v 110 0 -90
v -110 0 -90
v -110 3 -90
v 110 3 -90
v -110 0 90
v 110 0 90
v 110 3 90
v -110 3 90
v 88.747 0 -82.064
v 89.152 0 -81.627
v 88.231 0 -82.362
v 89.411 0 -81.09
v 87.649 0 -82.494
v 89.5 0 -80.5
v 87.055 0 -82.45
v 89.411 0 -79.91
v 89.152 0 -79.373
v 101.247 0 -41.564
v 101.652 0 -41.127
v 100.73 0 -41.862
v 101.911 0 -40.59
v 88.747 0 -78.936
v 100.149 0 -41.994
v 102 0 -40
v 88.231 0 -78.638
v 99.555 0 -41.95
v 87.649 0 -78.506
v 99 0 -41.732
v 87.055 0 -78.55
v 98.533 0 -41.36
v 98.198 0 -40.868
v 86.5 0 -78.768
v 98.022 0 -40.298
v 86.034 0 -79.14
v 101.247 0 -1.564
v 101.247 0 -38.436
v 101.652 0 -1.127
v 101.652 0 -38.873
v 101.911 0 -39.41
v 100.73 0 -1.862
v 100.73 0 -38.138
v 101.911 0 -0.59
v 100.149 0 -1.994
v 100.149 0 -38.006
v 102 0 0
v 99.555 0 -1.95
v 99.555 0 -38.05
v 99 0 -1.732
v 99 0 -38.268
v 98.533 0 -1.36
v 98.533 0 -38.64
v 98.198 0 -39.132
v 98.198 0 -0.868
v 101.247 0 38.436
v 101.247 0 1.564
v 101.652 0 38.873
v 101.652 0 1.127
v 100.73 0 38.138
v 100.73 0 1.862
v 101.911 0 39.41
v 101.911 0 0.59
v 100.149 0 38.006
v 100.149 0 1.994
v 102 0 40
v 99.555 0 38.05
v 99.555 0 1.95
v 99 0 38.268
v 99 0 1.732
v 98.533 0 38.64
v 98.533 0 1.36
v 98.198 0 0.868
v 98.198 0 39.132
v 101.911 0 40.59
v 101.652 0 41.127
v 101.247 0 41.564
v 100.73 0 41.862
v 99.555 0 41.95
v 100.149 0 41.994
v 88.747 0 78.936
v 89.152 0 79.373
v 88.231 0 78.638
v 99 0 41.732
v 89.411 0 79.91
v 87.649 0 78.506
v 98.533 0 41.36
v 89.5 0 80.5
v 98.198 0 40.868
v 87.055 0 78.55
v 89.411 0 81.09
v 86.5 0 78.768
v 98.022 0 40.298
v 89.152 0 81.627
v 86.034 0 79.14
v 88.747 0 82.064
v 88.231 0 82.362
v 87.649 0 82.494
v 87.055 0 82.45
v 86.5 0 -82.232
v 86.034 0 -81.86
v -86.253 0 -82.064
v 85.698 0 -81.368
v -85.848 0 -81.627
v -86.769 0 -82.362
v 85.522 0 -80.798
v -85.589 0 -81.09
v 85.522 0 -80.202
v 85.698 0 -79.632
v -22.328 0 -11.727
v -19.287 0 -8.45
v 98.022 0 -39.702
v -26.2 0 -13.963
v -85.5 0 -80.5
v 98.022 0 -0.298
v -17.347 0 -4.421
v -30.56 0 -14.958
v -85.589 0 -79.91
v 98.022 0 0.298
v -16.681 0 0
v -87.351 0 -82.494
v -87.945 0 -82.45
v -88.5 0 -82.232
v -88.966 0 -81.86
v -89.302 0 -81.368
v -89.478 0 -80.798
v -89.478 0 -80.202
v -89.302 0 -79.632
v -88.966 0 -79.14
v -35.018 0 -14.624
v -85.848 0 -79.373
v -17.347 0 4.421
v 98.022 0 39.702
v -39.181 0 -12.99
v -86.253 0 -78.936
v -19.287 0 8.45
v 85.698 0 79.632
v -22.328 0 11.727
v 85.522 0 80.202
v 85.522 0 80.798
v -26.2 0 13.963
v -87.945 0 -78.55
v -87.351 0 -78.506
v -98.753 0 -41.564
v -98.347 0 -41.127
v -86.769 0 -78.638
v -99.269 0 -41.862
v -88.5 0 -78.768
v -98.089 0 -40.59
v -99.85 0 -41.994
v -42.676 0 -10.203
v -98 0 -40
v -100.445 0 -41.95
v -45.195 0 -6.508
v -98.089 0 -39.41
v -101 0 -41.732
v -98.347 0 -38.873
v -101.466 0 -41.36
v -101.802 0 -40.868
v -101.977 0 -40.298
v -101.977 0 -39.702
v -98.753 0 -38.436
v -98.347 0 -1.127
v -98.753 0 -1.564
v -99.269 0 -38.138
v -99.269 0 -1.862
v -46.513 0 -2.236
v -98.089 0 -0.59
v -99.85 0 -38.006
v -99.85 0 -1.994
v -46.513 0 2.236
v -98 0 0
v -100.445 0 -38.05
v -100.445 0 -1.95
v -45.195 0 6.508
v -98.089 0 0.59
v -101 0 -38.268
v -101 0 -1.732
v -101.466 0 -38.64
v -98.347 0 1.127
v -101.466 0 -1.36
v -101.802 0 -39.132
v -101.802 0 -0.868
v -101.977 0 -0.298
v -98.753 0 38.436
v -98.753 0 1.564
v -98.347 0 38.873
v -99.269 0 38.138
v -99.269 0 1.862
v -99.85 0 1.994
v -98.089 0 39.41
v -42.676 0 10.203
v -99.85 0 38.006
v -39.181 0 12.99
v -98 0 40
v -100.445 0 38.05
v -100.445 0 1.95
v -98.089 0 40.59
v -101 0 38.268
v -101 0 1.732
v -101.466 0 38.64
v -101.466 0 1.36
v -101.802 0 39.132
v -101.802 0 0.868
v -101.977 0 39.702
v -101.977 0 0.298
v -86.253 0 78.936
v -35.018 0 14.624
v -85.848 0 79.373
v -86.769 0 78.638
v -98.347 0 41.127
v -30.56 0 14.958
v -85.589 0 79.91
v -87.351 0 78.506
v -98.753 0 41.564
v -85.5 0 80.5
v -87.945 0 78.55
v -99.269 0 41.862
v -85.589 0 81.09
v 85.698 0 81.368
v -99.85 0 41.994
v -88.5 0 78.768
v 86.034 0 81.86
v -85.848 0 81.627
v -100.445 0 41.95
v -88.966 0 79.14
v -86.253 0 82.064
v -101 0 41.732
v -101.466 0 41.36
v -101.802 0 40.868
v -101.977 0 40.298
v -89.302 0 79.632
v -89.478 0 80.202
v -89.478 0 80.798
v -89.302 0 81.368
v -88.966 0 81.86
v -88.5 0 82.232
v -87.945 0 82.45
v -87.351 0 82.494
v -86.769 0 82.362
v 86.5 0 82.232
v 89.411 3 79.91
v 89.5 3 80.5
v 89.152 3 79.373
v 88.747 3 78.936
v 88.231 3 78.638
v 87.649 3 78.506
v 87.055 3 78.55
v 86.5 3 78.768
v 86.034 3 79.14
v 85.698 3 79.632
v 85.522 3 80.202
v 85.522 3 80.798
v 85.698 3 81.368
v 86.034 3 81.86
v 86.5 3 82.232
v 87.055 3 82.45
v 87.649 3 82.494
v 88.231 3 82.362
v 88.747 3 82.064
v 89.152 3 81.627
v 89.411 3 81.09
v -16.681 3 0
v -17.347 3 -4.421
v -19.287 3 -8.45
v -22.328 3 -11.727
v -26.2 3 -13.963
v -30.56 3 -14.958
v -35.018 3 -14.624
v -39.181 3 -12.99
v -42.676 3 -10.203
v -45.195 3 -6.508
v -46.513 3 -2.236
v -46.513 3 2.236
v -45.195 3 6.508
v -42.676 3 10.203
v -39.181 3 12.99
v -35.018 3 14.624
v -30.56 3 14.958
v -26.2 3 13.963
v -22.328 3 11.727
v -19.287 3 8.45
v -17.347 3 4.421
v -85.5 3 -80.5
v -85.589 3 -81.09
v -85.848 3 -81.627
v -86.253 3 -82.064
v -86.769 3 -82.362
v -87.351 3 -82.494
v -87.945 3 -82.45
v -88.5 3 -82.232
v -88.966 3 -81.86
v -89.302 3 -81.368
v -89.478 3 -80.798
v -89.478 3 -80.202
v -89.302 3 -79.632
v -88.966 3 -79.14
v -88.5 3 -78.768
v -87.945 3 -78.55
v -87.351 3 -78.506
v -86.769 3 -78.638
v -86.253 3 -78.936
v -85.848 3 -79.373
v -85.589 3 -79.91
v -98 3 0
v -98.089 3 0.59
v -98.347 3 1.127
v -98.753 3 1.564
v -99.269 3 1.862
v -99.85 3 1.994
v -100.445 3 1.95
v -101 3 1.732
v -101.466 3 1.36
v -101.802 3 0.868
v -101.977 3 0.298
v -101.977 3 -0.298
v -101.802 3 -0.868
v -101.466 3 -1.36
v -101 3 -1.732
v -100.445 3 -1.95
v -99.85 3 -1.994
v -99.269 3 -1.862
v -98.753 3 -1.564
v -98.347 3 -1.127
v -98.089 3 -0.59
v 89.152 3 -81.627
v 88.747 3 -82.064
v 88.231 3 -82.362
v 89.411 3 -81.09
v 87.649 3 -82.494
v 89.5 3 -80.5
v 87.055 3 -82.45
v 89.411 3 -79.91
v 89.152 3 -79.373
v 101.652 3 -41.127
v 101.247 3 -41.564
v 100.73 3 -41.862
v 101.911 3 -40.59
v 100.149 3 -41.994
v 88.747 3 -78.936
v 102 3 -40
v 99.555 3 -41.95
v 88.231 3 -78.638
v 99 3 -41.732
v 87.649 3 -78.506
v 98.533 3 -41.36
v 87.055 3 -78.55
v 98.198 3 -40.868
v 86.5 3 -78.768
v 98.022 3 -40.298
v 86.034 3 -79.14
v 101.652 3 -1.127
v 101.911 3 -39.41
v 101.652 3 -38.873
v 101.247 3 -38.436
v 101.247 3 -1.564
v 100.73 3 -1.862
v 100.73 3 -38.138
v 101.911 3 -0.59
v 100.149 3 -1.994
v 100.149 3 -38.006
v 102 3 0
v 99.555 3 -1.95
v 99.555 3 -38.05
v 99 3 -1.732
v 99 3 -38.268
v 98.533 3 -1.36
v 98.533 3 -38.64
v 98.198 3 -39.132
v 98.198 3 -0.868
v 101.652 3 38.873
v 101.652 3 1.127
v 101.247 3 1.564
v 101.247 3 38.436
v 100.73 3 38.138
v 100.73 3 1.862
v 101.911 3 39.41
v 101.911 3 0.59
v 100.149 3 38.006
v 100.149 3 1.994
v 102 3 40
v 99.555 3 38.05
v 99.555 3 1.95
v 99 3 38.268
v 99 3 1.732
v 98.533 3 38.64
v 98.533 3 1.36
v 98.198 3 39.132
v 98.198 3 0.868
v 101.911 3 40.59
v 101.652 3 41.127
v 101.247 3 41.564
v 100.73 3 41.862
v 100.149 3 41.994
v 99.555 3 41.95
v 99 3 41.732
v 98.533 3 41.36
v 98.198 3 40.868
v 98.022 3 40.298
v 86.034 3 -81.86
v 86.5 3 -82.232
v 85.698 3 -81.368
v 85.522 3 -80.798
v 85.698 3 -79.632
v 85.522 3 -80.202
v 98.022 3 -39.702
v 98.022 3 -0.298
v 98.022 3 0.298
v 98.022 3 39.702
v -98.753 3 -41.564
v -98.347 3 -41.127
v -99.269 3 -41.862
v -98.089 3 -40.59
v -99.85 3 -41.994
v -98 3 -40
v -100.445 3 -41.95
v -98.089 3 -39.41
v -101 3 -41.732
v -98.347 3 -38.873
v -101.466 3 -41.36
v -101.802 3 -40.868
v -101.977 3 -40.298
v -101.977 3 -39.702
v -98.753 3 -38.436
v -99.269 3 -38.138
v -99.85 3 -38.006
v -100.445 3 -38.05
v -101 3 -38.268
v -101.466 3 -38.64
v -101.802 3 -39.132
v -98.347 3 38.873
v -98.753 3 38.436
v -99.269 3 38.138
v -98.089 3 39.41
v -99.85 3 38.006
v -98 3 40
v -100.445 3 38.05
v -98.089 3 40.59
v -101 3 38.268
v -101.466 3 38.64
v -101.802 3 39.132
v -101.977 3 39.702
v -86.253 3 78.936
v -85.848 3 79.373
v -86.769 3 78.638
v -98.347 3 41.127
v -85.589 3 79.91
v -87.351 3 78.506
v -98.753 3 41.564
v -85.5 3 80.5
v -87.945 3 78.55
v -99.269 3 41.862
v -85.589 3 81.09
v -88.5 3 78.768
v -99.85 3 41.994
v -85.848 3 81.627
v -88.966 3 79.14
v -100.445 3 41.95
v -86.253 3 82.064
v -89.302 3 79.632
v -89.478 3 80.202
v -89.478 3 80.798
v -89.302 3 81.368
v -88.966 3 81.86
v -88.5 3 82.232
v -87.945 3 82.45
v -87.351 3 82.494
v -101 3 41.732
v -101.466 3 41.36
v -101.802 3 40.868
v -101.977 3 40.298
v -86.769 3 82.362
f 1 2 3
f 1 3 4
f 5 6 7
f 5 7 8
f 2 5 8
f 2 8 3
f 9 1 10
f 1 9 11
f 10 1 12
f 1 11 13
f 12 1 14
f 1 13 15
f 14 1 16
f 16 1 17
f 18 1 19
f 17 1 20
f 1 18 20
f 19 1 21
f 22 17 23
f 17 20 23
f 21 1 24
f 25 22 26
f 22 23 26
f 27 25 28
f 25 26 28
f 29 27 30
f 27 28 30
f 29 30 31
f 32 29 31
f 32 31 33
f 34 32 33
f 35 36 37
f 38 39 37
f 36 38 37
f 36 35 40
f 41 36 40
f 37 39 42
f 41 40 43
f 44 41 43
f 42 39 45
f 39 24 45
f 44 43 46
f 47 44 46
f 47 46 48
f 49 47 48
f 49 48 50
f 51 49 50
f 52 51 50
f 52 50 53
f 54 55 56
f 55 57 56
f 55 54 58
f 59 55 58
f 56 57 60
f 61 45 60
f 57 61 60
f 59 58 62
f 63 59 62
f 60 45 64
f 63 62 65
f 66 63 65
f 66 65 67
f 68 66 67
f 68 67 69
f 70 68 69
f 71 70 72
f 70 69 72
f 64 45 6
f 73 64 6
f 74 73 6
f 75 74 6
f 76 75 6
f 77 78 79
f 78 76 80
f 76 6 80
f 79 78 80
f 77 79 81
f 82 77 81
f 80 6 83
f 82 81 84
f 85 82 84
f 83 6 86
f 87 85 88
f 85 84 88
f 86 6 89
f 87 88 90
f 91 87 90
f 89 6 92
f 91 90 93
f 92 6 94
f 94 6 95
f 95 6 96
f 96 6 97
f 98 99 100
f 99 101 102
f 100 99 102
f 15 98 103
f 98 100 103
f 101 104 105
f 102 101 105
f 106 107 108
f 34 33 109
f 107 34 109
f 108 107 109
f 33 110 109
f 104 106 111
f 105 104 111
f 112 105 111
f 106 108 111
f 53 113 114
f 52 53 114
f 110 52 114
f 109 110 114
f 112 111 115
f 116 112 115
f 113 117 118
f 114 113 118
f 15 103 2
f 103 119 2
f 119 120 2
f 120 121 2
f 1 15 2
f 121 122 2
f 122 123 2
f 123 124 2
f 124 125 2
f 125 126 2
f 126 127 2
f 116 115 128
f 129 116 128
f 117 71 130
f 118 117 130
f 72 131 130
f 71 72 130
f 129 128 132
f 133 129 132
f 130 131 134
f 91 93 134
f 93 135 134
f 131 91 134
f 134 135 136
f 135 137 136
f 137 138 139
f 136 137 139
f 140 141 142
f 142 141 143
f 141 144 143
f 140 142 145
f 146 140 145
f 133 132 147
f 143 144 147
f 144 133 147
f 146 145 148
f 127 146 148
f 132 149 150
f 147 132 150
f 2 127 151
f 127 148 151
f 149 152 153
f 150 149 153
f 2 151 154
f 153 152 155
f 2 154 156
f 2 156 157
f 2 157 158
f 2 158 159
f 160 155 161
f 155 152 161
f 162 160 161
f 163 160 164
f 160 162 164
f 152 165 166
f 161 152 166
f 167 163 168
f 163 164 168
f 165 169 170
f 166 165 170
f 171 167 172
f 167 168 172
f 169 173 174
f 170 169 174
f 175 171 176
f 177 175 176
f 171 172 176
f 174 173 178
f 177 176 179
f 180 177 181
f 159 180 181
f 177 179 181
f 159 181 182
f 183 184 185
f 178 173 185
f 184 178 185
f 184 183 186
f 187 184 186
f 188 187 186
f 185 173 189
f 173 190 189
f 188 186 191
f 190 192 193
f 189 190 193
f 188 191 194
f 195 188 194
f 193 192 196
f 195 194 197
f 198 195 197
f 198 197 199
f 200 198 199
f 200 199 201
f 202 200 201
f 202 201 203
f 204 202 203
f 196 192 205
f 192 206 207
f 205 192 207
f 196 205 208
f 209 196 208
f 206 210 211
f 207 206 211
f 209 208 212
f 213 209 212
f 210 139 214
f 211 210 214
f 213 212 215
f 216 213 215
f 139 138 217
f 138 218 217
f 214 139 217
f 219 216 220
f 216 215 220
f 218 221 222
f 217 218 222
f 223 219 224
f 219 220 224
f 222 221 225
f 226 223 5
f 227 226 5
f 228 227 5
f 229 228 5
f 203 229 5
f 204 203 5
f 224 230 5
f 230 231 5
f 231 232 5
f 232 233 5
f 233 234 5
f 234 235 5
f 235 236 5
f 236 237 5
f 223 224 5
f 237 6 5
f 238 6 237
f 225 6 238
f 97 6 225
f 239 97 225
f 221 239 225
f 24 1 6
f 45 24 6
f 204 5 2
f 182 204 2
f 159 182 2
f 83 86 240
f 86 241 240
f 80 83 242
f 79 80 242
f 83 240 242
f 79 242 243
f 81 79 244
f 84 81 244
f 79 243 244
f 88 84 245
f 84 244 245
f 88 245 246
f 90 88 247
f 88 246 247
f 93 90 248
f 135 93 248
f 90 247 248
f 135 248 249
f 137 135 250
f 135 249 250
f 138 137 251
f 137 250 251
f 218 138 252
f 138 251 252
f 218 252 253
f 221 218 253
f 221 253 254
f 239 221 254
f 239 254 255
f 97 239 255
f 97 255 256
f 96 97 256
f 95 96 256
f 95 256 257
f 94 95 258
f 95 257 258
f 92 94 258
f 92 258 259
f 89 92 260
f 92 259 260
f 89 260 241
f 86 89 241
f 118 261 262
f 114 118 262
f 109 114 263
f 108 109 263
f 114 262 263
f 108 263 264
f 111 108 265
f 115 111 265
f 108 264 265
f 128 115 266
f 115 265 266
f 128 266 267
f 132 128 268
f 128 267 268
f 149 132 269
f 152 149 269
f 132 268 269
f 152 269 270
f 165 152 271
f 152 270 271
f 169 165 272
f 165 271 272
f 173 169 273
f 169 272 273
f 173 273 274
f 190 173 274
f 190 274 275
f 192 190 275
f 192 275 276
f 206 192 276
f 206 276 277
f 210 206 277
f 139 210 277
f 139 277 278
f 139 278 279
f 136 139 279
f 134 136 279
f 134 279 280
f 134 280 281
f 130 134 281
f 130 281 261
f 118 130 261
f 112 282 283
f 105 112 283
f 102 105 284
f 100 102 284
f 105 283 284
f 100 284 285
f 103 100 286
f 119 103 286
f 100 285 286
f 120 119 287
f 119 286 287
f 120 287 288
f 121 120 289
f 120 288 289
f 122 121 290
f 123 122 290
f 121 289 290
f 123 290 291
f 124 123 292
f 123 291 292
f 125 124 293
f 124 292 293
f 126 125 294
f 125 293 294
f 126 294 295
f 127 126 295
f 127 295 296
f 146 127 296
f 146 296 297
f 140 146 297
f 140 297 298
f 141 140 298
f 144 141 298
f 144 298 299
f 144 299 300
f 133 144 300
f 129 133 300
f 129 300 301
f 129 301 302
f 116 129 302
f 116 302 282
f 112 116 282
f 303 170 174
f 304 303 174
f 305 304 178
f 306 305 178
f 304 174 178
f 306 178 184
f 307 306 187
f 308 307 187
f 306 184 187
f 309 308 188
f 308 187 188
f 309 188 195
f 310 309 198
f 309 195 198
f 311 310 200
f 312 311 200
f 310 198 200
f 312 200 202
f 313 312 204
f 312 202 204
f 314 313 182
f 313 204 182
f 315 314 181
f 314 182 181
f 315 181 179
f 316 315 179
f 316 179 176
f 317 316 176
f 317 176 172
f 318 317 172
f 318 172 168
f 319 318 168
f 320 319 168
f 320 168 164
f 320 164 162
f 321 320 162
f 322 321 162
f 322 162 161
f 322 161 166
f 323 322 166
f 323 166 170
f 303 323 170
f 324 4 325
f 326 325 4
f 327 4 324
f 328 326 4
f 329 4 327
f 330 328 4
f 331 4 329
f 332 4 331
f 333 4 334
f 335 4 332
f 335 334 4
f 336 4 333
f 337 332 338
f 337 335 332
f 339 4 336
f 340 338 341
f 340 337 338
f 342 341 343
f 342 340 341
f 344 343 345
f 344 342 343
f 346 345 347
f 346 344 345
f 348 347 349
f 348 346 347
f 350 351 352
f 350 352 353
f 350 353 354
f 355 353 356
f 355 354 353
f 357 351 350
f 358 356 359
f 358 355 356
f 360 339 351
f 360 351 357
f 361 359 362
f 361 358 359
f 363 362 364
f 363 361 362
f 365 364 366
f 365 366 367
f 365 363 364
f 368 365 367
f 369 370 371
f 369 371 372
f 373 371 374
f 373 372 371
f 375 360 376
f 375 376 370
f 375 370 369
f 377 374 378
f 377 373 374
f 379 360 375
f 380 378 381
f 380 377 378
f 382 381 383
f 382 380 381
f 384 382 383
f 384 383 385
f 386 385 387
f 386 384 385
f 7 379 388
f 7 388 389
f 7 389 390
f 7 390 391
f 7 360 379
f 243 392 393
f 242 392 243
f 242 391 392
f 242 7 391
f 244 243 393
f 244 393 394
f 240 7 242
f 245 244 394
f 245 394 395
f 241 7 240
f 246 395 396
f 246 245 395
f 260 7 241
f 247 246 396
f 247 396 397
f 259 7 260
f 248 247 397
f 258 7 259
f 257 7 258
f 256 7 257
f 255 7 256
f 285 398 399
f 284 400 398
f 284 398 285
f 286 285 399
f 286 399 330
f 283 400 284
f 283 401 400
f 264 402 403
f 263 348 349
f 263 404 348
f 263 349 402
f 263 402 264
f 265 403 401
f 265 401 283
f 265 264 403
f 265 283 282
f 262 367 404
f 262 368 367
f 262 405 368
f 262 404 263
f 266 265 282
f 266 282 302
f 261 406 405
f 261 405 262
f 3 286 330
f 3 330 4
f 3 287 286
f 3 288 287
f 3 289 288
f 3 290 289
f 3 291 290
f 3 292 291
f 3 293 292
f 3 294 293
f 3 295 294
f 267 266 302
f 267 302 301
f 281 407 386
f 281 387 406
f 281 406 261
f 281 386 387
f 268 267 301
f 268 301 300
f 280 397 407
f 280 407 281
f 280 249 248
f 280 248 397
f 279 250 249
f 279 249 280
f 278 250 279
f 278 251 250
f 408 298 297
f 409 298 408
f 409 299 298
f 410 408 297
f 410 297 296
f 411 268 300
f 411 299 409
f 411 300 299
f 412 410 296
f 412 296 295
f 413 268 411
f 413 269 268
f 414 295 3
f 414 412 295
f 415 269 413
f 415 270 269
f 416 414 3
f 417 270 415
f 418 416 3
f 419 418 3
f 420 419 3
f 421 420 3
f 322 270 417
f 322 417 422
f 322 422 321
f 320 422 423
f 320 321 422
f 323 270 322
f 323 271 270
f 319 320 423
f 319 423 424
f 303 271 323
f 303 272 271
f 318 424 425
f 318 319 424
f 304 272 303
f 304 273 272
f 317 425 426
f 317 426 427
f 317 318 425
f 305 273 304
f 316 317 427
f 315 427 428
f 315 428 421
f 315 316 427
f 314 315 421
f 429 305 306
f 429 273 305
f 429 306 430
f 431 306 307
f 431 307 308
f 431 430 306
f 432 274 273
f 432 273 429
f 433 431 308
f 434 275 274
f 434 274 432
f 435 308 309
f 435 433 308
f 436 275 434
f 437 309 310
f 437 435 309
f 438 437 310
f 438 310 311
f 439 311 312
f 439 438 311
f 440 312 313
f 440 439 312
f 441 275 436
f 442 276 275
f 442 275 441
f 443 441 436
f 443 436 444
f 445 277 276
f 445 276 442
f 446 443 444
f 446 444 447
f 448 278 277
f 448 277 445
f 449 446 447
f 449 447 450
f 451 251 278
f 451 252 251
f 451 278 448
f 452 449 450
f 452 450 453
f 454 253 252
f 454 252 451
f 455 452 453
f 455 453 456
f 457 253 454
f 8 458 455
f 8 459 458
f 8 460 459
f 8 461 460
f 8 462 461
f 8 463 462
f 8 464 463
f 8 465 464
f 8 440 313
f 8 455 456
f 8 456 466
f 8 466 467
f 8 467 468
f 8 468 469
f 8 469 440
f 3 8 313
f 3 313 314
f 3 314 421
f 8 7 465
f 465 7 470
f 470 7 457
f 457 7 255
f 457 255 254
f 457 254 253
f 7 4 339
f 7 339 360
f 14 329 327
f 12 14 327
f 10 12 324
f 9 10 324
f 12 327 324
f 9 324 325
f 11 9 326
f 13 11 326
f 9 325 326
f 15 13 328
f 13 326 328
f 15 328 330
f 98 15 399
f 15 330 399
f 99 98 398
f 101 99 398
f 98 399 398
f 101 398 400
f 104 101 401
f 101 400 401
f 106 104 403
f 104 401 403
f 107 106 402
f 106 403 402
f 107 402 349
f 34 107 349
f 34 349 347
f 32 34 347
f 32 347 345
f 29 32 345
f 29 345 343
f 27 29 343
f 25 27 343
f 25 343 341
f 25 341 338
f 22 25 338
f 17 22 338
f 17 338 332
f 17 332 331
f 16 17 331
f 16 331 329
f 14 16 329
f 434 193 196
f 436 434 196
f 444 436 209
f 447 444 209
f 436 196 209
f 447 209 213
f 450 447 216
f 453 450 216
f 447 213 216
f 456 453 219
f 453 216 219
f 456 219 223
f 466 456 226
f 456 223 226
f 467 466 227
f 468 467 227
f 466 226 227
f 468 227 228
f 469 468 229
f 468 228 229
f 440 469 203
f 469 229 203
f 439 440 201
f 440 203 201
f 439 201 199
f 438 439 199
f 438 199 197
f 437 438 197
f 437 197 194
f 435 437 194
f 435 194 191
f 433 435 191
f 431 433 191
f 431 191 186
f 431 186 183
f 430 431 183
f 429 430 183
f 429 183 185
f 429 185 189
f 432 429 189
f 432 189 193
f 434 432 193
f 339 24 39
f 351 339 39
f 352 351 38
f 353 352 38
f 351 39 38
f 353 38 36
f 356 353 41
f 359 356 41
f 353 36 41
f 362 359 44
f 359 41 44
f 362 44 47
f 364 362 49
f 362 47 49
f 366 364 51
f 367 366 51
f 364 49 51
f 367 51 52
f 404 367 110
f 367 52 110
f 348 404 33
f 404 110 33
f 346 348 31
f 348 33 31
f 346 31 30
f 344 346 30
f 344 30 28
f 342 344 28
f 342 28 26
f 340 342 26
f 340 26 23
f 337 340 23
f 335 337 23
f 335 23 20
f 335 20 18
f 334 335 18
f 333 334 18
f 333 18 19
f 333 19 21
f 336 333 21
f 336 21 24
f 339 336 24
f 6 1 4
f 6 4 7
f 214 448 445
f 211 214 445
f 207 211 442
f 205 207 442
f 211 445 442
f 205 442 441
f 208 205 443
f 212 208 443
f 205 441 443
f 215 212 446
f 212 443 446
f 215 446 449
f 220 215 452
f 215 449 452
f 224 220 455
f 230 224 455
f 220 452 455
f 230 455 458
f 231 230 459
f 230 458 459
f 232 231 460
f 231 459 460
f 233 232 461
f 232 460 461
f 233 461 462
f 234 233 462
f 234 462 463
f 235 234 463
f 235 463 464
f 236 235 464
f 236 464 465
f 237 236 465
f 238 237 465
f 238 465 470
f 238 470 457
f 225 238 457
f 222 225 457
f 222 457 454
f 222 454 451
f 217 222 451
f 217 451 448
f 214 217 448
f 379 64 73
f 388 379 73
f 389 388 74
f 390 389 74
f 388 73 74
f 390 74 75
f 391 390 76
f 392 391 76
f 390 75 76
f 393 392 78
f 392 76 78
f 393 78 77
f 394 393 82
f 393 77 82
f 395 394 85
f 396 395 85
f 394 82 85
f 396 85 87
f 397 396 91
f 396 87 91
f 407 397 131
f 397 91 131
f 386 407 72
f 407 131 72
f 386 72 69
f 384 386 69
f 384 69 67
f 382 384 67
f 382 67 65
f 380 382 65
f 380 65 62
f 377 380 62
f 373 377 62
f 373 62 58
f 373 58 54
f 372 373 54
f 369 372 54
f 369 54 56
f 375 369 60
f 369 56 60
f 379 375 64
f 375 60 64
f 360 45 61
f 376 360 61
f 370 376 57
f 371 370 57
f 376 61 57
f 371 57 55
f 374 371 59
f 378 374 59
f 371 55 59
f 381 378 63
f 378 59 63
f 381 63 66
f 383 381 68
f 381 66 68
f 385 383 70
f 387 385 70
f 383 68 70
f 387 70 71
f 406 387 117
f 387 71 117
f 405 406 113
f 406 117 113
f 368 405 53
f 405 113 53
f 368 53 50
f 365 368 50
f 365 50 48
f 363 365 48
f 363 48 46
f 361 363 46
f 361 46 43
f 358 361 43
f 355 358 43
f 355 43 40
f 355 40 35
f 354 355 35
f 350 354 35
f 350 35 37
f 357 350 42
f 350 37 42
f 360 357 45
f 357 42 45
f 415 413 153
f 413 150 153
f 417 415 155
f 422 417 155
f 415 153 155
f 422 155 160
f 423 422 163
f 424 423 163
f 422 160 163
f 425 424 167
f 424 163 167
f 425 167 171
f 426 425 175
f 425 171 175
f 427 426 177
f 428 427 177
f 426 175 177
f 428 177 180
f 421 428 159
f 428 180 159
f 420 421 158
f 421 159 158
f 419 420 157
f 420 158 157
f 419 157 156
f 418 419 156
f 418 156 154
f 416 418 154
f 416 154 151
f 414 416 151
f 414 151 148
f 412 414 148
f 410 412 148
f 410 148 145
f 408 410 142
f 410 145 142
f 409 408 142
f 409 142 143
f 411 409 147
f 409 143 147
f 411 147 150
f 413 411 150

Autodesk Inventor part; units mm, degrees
ref_plane "YZ Plane" through (0, 0, 0) normal (1, 0, 0) x (0, 1, 0)
ref_plane "XZ Plane" through (0, 0, 0) normal (0, 1, 0) x (-1, 0, 0)
ref_plane "XY Plane" through (0, 0, 0) normal (0, 0, 1) x (1, 0, 0)
sketch "Эскиз1" plane through (0, 0, 0) normal (0, 1, 0) x (-1, 0, 0)
  line L0 (-110, 90) -> (110, 90)
  line L1 (110, 90) -> (110, -90)
  line L2 (110, -90) -> (-110, -90)
  line L3 (-110, -90) -> (-110, 90)
  line L4 (-110, 90) -> (110, -90) construction
  line L5 (110, 90) -> (-110, -90) construction
  point P0 (0, 0)
  dimension "d0" = 220
  dimension "d1" = 180
extrude "Выдавливание1" add sketch "Эскиз1" along normal blind 3
sketch "Эскиз2" plane through (0, 0, 0) normal (0, -1, 0) x (1, 0, 0)
  circle A0 centre (99.9996, -40) radius 2 projected
  circle A1 centre (99.9996, 0) radius 2 projected
  circle A2 centre (99.9996, 40) radius 2 projected
  circle A3 centre (-99.9997, 0) radius 2 projected
  circle A4 centre (-99.9997, -40) radius 2 projected
  circle A5 centre (-99.9997, 40) radius 2 projected
  point P0 (0, 0)
extrude "Выдавливание2" cut sketch "Эскиз2" against normal blind 3
sketch "Эскиз3" plane through (0, 3, 0) normal (0, 1, 0) x (1, 0, 0)
  circle A0 centre (87.4999, 80.5) radius 2 projected
  circle A1 centre (-87.5001, 80.5) radius 2 projected
  circle A2 centre (-87.5001, -80.5) radius 2 projected
  circle A3 centre (87.4999, -80.5) radius 2 projected
  point P0 (0, 0)
extrude "Выдавливание3" cut sketch "Эскиз3" against normal blind 10
sketch "Эскиз4" plane through (0, 3, 0) normal (0, 1, 0) x (1, 0, 0)
  circle A0 centre (-31.6806, 0) radius 15 projected
  point P0 (0, 0)
extrude "Выдавливание4" cut sketch "Эскиз4" against normal blind 10
properties part number "000.003 - cap"
